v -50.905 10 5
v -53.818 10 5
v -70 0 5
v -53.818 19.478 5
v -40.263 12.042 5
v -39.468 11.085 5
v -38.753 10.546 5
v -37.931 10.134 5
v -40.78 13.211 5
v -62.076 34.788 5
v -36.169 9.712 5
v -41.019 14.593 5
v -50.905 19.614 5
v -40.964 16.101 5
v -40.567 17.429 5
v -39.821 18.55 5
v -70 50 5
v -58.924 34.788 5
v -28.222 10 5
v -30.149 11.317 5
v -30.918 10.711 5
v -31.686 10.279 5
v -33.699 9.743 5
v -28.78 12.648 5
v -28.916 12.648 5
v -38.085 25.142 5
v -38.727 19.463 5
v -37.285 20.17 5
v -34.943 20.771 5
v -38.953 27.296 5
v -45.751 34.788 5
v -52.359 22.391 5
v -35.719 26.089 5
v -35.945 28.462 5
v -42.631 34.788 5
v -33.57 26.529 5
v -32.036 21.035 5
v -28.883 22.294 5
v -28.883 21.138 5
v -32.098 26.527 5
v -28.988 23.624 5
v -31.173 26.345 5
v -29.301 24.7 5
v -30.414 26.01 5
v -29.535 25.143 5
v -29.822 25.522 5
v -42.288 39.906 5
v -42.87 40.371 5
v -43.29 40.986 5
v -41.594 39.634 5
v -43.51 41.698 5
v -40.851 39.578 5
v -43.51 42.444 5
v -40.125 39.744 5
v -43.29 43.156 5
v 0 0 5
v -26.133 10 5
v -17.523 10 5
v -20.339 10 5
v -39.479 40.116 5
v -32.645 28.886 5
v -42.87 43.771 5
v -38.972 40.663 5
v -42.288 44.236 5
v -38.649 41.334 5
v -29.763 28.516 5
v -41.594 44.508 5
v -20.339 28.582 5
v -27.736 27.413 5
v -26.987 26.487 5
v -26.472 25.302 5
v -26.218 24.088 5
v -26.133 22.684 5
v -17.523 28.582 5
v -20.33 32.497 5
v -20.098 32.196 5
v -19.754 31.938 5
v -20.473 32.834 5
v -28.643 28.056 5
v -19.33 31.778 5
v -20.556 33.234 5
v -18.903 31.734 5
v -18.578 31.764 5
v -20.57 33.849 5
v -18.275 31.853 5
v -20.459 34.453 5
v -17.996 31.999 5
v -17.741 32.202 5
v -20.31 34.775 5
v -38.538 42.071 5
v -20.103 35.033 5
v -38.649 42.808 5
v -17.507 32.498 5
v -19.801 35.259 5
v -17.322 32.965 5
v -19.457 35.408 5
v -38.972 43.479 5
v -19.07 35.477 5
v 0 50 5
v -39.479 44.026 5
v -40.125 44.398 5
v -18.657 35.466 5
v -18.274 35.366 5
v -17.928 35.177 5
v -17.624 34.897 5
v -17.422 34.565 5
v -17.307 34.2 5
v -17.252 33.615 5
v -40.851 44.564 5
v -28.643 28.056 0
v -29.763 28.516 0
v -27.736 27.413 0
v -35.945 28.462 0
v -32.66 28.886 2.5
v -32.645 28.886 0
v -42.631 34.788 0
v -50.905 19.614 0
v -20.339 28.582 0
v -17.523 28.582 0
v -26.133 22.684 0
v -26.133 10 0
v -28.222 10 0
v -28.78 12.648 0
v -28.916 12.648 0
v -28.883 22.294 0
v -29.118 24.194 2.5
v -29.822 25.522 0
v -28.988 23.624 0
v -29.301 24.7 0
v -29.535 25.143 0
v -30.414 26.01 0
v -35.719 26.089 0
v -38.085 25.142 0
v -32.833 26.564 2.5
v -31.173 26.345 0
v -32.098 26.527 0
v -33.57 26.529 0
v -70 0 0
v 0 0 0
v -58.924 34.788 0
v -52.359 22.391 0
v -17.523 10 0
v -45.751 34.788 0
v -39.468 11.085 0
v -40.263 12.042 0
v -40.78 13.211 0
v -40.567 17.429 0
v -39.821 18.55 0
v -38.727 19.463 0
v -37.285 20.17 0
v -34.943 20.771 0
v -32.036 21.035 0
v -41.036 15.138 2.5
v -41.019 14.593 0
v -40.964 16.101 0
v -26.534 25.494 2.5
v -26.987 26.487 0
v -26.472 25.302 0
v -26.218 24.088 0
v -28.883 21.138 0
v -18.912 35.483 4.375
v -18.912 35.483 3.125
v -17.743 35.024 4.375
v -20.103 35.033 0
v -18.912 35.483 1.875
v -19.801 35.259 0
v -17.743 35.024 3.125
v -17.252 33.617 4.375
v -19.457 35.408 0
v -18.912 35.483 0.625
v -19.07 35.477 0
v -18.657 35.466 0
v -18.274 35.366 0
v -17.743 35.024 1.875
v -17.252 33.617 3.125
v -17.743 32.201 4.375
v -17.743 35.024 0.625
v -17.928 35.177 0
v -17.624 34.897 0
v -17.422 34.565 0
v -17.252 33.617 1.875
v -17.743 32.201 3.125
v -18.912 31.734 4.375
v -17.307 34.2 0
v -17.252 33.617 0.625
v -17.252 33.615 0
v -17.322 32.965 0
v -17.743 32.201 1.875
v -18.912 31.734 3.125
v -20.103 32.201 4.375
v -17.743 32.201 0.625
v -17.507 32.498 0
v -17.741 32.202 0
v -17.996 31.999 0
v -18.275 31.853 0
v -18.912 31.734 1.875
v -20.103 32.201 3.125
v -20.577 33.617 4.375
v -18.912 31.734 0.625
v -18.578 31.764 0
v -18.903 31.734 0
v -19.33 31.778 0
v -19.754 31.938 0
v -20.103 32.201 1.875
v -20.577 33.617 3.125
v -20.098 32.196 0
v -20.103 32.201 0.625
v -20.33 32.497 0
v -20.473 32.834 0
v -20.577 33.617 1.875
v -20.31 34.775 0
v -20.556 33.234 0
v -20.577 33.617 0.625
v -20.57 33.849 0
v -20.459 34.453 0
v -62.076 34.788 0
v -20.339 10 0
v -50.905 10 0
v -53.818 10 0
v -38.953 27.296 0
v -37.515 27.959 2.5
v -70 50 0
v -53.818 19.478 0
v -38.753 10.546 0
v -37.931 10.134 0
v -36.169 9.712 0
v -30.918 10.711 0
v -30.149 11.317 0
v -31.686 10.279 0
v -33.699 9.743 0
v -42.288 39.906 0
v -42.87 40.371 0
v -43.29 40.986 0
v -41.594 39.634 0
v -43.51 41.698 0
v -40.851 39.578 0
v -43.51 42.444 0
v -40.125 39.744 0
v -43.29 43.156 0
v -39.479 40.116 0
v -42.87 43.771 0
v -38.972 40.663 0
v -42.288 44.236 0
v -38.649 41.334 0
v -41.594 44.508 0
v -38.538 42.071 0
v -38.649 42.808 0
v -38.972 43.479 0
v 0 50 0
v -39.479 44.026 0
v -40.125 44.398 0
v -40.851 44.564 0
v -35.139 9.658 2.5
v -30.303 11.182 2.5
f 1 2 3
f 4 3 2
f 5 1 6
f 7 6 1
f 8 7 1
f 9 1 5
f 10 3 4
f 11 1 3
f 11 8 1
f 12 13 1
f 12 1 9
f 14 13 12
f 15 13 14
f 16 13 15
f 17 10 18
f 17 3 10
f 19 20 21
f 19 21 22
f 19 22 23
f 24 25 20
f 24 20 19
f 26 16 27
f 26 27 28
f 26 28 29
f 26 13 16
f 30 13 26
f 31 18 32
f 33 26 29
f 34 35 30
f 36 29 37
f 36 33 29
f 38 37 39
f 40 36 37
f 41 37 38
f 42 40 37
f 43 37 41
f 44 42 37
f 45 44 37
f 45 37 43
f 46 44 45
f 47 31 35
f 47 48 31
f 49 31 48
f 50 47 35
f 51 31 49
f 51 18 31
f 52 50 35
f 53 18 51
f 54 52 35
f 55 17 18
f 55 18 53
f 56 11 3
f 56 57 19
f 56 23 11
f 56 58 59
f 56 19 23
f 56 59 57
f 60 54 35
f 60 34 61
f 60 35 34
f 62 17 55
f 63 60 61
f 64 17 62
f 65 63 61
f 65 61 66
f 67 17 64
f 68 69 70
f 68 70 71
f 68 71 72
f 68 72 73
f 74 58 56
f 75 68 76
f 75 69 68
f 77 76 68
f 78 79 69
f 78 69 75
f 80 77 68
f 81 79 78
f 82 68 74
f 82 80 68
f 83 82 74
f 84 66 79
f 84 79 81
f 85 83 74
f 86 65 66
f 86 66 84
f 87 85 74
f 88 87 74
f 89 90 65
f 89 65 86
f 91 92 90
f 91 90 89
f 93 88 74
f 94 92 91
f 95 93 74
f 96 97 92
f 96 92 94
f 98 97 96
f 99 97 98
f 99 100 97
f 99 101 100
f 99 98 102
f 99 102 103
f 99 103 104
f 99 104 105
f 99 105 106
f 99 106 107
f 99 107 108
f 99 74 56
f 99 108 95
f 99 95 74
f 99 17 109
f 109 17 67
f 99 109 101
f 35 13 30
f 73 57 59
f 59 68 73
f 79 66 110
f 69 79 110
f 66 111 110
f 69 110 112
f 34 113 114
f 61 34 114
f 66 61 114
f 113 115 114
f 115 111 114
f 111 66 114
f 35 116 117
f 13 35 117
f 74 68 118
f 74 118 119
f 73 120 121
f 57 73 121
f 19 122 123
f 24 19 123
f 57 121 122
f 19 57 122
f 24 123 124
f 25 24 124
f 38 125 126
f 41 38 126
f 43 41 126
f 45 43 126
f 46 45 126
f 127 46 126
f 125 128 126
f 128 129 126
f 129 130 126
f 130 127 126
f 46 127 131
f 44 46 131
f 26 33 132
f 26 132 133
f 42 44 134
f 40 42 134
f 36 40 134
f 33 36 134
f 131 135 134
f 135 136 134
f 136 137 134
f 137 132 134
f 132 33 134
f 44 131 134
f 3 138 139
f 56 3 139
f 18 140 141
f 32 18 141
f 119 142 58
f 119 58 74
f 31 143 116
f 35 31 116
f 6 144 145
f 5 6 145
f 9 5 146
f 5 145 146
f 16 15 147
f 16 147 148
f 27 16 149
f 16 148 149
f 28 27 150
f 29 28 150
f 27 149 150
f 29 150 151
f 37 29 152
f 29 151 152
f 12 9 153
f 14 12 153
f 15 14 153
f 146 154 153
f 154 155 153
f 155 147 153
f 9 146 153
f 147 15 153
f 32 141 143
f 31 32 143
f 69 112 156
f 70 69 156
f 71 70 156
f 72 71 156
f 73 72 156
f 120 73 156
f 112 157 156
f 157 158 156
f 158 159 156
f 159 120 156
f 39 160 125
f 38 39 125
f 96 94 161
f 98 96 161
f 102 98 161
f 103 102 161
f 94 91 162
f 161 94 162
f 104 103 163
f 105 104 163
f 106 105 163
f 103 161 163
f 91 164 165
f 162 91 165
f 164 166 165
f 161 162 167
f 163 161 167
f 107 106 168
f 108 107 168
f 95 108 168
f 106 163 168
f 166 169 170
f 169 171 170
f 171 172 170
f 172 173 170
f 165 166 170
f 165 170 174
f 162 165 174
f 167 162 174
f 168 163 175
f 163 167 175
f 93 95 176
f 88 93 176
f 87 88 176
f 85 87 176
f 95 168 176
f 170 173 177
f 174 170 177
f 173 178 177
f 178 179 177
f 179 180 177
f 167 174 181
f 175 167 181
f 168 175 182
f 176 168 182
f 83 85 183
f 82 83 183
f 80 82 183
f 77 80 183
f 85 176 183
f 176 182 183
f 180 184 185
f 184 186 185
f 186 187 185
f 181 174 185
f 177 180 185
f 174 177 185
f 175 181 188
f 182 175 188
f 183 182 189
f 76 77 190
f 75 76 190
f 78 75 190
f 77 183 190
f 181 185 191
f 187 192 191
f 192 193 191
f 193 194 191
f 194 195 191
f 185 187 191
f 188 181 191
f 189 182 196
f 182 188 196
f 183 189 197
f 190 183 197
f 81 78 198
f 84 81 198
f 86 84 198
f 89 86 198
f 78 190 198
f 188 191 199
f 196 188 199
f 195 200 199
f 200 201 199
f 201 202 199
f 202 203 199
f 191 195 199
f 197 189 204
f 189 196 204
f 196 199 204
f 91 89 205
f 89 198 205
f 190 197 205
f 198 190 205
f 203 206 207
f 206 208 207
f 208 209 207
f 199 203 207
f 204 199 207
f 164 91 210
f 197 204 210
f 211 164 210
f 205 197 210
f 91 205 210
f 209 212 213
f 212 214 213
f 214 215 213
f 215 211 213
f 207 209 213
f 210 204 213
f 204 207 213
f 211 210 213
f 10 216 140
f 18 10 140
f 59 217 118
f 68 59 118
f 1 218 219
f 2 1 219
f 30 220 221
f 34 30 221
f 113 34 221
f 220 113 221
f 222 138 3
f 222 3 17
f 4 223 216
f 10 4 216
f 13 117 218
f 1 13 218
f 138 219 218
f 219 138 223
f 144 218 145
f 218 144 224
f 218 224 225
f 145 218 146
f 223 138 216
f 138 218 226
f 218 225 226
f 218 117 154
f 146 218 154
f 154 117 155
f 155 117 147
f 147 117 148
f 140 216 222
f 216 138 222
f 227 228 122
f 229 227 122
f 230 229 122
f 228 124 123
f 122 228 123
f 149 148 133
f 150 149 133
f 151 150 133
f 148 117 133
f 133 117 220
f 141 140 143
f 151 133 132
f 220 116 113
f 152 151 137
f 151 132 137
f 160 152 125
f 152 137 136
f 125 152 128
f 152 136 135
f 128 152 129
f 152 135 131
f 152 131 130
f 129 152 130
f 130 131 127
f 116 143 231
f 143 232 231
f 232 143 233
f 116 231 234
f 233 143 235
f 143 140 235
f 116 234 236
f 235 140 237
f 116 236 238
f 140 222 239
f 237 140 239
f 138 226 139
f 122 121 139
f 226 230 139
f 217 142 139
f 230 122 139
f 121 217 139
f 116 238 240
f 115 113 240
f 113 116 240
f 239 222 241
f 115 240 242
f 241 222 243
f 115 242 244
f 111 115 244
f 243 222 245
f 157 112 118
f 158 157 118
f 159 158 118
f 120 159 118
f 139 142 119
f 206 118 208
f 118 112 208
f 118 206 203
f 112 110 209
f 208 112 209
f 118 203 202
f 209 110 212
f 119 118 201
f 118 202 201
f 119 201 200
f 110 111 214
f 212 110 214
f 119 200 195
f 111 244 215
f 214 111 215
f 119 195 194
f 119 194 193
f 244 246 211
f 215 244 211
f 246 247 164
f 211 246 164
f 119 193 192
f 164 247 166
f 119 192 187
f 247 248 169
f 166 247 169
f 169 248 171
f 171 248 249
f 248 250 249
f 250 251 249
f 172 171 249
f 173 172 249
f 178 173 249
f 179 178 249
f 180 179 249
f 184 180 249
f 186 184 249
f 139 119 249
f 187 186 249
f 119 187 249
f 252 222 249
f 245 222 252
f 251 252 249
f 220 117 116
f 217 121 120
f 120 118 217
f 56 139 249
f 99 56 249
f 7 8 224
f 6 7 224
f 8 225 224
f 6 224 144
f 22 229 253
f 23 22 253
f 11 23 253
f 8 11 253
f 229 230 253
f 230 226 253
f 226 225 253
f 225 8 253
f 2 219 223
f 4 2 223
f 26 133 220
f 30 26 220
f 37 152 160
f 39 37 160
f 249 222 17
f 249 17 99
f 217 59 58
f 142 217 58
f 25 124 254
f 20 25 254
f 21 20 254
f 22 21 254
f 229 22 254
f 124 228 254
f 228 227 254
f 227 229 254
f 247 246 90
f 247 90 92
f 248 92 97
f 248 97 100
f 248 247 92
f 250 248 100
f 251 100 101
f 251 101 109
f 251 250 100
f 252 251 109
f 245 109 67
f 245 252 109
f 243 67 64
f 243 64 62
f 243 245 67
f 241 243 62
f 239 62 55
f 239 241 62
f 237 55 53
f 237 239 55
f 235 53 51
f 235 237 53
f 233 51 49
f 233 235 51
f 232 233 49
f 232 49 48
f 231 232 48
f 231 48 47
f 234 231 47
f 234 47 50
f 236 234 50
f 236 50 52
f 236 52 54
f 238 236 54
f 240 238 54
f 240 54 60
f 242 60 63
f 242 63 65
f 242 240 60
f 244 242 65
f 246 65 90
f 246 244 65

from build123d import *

# Parameters (mm, degrees)
F0_W     = 70
F0_H     = 50
F0_W_2   = 2.8157552083
F0_H_2   = 18.5818142361
F0_R     = 2.5
F1_DEPTH = 5


with BuildPart() as f1:
    # F0 (on Top) → F1 (new body)
    with BuildSketch(Plane.XY):
        with Locations((-35, 25)):
            Rectangle(F0_W, F0_H)
        Polygon((-58.9236111111, 34.7884114583), (-52.3589409722, 22.3914930556), (-45.7508680556, 34.7884114583), (-42.6312934028, 34.7884114583), (-50.9049479167, 19.6137152778), (-50.9049479167, 10), (-53.818359375, 10), (-53.818359375, 19.4780815972), (-62.0757378472, 34.7884114583), align=None, mode=Mode.SUBTRACT)
        with BuildLine():
            Line((-26.1328125, 10), (-28.2215711806, 10))
            Line((-28.2215711806, 10), (-28.7803819444, 12.6475694444))
            Line((-28.7803819444, 12.6475694444), (-28.916015625, 12.6475694444))
            add(Edge.make_bspline(
                [(-28.916015625, 12.6475694444), (-30.3049045139, 10.9006076389), (-31.6856553819, 10.2794053819)],
                knots=[0, 0, 0, 1, 1, 1], degree=2))
            add(Edge.make_bspline(
                [(-31.6856553819, 10.2794053819), (-33.06640625, 9.658203125), (-35.1388888889, 9.658203125)],
                knots=[0, 0, 0, 1, 1, 1], degree=2))
            add(Edge.make_bspline(
                [(-35.1388888889, 9.658203125), (-37.900390625, 9.658203125), (-39.4683159722, 11.0850694444)],
                knots=[0, 0, 0, 1, 1, 1], degree=2))
            add(Edge.make_bspline(
                [(-39.4683159722, 11.0850694444), (-41.0362413194, 12.5119357639), (-41.0362413194, 15.1378038194)],
                knots=[0, 0, 0, 1, 1, 1], degree=2))
            add(Edge.make_bspline(
                [(-41.0362413194, 15.1378038194), (-41.0362413194, 20.7638888889), (-32.0355902778, 21.03515625)],
                knots=[0, 0, 0, 1, 1, 1], degree=2))
            Line((-32.0355902778, 21.03515625), (-28.8834635417, 21.1382378472))
            Line((-28.8834635417, 21.1382378472), (-28.8834635417, 22.2938368056))
            add(Edge.make_bspline(
                [(-28.8834635417, 22.2938368056), (-28.8834635417, 24.4802517361), (-29.8220486111, 25.5219184028)],
                knots=[0, 0, 0, 1, 1, 1], degree=2))
            add(Edge.make_bspline(
                [(-29.8220486111, 25.5219184028), (-30.7606336806, 26.5635850694), (-32.8331163194, 26.5635850694)],
                knots=[0, 0, 0, 1, 1, 1], degree=2))
            add(Edge.make_bspline(
                [(-32.8331163194, 26.5635850694), (-35.1551649306, 26.5635850694), (-38.0848524306, 25.1421440972)],
                knots=[0, 0, 0, 1, 1, 1], degree=2))
            Line((-38.0848524306, 25.1421440972), (-38.9529079861, 27.2960069444))
            add(Edge.make_bspline(
                [(-38.9529079861, 27.2960069444), (-37.5802951389, 28.0392795139), (-35.9445529514, 28.4624565972)],
                knots=[0, 0, 0, 1, 1, 1], degree=2))
            add(Edge.make_bspline(
                [(-35.9445529514, 28.4624565972), (-34.3088107639, 28.8856336806), (-32.6595052083, 28.8856336806)],
                knots=[0, 0, 0, 1, 1, 1], degree=2))
            add(Edge.make_bspline(
                [(-32.6595052083, 28.8856336806), (-29.3391927083, 28.8856336806), (-27.7360026042, 27.4126519097)],
                knots=[0, 0, 0, 1, 1, 1], degree=2))
            add(Edge.make_bspline(
                [(-27.7360026042, 27.4126519097), (-26.1328125, 25.9396701389), (-26.1328125, 22.6844618056)],
                knots=[0, 0, 0, 1, 1, 1], degree=2))
            Line((-26.1328125, 22.6844618056), (-26.1328125, 10))
        make_face(mode=Mode.SUBTRACT)
        with Locations((-18.9306640625, 19.2909071181)):
            Rectangle(F0_W_2, F0_H_2, mode=Mode.SUBTRACT)
        with Locations((-41.0378689236, 42.0710678119)):
            Circle(F0_R, mode=Mode.SUBTRACT)
        with BuildLine():
            add(Edge.make_bspline(
                [(-20.1025390625, 32.2005208333), (-20.5772569444, 32.6671006944), (-20.5772569444, 33.6165364583)],
                knots=[0, 0, 0, 1, 1, 1], degree=2))
            add(Edge.make_bspline(
                [(-20.5772569444, 33.6165364583), (-20.5772569444, 34.5822482639), (-20.1025390625, 35.0325520833)],
                knots=[0, 0, 0, 1, 1, 1], degree=2))
            add(Edge.make_bspline(
                [(-20.1025390625, 35.0325520833), (-19.6278211806, 35.4828559028), (-18.9116753472, 35.4828559028)],
                knots=[0, 0, 0, 1, 1, 1], degree=2))
            add(Edge.make_bspline(
                [(-18.9116753472, 35.4828559028), (-18.2335069444, 35.4828559028), (-17.7425130208, 35.0244140625)],
                knots=[0, 0, 0, 1, 1, 1], degree=2))
            add(Edge.make_bspline(
                [(-17.7425130208, 35.0244140625), (-17.2515190972, 34.5659722222), (-17.2515190972, 33.6165364583)],
                knots=[0, 0, 0, 1, 1, 1], degree=2))
            add(Edge.make_bspline(
                [(-17.2515190972, 33.6165364583), (-17.2515190972, 32.6671006944), (-17.7425130208, 32.2005208333)],
                knots=[0, 0, 0, 1, 1, 1], degree=2))
            add(Edge.make_bspline(
                [(-17.7425130208, 32.2005208333), (-18.2335069444, 31.7339409722), (-18.9116753472, 31.7339409722)],
                knots=[0, 0, 0, 1, 1, 1], degree=2))
            add(Edge.make_bspline(
                [(-18.9116753472, 31.7339409722), (-19.6278211806, 31.7339409722), (-20.1025390625, 32.2005208333)],
                knots=[0, 0, 0, 1, 1, 1], degree=2))
        make_face(mode=Mode.SUBTRACT)
    extrude(amount=F1_DEPTH)


solid = f1.part
